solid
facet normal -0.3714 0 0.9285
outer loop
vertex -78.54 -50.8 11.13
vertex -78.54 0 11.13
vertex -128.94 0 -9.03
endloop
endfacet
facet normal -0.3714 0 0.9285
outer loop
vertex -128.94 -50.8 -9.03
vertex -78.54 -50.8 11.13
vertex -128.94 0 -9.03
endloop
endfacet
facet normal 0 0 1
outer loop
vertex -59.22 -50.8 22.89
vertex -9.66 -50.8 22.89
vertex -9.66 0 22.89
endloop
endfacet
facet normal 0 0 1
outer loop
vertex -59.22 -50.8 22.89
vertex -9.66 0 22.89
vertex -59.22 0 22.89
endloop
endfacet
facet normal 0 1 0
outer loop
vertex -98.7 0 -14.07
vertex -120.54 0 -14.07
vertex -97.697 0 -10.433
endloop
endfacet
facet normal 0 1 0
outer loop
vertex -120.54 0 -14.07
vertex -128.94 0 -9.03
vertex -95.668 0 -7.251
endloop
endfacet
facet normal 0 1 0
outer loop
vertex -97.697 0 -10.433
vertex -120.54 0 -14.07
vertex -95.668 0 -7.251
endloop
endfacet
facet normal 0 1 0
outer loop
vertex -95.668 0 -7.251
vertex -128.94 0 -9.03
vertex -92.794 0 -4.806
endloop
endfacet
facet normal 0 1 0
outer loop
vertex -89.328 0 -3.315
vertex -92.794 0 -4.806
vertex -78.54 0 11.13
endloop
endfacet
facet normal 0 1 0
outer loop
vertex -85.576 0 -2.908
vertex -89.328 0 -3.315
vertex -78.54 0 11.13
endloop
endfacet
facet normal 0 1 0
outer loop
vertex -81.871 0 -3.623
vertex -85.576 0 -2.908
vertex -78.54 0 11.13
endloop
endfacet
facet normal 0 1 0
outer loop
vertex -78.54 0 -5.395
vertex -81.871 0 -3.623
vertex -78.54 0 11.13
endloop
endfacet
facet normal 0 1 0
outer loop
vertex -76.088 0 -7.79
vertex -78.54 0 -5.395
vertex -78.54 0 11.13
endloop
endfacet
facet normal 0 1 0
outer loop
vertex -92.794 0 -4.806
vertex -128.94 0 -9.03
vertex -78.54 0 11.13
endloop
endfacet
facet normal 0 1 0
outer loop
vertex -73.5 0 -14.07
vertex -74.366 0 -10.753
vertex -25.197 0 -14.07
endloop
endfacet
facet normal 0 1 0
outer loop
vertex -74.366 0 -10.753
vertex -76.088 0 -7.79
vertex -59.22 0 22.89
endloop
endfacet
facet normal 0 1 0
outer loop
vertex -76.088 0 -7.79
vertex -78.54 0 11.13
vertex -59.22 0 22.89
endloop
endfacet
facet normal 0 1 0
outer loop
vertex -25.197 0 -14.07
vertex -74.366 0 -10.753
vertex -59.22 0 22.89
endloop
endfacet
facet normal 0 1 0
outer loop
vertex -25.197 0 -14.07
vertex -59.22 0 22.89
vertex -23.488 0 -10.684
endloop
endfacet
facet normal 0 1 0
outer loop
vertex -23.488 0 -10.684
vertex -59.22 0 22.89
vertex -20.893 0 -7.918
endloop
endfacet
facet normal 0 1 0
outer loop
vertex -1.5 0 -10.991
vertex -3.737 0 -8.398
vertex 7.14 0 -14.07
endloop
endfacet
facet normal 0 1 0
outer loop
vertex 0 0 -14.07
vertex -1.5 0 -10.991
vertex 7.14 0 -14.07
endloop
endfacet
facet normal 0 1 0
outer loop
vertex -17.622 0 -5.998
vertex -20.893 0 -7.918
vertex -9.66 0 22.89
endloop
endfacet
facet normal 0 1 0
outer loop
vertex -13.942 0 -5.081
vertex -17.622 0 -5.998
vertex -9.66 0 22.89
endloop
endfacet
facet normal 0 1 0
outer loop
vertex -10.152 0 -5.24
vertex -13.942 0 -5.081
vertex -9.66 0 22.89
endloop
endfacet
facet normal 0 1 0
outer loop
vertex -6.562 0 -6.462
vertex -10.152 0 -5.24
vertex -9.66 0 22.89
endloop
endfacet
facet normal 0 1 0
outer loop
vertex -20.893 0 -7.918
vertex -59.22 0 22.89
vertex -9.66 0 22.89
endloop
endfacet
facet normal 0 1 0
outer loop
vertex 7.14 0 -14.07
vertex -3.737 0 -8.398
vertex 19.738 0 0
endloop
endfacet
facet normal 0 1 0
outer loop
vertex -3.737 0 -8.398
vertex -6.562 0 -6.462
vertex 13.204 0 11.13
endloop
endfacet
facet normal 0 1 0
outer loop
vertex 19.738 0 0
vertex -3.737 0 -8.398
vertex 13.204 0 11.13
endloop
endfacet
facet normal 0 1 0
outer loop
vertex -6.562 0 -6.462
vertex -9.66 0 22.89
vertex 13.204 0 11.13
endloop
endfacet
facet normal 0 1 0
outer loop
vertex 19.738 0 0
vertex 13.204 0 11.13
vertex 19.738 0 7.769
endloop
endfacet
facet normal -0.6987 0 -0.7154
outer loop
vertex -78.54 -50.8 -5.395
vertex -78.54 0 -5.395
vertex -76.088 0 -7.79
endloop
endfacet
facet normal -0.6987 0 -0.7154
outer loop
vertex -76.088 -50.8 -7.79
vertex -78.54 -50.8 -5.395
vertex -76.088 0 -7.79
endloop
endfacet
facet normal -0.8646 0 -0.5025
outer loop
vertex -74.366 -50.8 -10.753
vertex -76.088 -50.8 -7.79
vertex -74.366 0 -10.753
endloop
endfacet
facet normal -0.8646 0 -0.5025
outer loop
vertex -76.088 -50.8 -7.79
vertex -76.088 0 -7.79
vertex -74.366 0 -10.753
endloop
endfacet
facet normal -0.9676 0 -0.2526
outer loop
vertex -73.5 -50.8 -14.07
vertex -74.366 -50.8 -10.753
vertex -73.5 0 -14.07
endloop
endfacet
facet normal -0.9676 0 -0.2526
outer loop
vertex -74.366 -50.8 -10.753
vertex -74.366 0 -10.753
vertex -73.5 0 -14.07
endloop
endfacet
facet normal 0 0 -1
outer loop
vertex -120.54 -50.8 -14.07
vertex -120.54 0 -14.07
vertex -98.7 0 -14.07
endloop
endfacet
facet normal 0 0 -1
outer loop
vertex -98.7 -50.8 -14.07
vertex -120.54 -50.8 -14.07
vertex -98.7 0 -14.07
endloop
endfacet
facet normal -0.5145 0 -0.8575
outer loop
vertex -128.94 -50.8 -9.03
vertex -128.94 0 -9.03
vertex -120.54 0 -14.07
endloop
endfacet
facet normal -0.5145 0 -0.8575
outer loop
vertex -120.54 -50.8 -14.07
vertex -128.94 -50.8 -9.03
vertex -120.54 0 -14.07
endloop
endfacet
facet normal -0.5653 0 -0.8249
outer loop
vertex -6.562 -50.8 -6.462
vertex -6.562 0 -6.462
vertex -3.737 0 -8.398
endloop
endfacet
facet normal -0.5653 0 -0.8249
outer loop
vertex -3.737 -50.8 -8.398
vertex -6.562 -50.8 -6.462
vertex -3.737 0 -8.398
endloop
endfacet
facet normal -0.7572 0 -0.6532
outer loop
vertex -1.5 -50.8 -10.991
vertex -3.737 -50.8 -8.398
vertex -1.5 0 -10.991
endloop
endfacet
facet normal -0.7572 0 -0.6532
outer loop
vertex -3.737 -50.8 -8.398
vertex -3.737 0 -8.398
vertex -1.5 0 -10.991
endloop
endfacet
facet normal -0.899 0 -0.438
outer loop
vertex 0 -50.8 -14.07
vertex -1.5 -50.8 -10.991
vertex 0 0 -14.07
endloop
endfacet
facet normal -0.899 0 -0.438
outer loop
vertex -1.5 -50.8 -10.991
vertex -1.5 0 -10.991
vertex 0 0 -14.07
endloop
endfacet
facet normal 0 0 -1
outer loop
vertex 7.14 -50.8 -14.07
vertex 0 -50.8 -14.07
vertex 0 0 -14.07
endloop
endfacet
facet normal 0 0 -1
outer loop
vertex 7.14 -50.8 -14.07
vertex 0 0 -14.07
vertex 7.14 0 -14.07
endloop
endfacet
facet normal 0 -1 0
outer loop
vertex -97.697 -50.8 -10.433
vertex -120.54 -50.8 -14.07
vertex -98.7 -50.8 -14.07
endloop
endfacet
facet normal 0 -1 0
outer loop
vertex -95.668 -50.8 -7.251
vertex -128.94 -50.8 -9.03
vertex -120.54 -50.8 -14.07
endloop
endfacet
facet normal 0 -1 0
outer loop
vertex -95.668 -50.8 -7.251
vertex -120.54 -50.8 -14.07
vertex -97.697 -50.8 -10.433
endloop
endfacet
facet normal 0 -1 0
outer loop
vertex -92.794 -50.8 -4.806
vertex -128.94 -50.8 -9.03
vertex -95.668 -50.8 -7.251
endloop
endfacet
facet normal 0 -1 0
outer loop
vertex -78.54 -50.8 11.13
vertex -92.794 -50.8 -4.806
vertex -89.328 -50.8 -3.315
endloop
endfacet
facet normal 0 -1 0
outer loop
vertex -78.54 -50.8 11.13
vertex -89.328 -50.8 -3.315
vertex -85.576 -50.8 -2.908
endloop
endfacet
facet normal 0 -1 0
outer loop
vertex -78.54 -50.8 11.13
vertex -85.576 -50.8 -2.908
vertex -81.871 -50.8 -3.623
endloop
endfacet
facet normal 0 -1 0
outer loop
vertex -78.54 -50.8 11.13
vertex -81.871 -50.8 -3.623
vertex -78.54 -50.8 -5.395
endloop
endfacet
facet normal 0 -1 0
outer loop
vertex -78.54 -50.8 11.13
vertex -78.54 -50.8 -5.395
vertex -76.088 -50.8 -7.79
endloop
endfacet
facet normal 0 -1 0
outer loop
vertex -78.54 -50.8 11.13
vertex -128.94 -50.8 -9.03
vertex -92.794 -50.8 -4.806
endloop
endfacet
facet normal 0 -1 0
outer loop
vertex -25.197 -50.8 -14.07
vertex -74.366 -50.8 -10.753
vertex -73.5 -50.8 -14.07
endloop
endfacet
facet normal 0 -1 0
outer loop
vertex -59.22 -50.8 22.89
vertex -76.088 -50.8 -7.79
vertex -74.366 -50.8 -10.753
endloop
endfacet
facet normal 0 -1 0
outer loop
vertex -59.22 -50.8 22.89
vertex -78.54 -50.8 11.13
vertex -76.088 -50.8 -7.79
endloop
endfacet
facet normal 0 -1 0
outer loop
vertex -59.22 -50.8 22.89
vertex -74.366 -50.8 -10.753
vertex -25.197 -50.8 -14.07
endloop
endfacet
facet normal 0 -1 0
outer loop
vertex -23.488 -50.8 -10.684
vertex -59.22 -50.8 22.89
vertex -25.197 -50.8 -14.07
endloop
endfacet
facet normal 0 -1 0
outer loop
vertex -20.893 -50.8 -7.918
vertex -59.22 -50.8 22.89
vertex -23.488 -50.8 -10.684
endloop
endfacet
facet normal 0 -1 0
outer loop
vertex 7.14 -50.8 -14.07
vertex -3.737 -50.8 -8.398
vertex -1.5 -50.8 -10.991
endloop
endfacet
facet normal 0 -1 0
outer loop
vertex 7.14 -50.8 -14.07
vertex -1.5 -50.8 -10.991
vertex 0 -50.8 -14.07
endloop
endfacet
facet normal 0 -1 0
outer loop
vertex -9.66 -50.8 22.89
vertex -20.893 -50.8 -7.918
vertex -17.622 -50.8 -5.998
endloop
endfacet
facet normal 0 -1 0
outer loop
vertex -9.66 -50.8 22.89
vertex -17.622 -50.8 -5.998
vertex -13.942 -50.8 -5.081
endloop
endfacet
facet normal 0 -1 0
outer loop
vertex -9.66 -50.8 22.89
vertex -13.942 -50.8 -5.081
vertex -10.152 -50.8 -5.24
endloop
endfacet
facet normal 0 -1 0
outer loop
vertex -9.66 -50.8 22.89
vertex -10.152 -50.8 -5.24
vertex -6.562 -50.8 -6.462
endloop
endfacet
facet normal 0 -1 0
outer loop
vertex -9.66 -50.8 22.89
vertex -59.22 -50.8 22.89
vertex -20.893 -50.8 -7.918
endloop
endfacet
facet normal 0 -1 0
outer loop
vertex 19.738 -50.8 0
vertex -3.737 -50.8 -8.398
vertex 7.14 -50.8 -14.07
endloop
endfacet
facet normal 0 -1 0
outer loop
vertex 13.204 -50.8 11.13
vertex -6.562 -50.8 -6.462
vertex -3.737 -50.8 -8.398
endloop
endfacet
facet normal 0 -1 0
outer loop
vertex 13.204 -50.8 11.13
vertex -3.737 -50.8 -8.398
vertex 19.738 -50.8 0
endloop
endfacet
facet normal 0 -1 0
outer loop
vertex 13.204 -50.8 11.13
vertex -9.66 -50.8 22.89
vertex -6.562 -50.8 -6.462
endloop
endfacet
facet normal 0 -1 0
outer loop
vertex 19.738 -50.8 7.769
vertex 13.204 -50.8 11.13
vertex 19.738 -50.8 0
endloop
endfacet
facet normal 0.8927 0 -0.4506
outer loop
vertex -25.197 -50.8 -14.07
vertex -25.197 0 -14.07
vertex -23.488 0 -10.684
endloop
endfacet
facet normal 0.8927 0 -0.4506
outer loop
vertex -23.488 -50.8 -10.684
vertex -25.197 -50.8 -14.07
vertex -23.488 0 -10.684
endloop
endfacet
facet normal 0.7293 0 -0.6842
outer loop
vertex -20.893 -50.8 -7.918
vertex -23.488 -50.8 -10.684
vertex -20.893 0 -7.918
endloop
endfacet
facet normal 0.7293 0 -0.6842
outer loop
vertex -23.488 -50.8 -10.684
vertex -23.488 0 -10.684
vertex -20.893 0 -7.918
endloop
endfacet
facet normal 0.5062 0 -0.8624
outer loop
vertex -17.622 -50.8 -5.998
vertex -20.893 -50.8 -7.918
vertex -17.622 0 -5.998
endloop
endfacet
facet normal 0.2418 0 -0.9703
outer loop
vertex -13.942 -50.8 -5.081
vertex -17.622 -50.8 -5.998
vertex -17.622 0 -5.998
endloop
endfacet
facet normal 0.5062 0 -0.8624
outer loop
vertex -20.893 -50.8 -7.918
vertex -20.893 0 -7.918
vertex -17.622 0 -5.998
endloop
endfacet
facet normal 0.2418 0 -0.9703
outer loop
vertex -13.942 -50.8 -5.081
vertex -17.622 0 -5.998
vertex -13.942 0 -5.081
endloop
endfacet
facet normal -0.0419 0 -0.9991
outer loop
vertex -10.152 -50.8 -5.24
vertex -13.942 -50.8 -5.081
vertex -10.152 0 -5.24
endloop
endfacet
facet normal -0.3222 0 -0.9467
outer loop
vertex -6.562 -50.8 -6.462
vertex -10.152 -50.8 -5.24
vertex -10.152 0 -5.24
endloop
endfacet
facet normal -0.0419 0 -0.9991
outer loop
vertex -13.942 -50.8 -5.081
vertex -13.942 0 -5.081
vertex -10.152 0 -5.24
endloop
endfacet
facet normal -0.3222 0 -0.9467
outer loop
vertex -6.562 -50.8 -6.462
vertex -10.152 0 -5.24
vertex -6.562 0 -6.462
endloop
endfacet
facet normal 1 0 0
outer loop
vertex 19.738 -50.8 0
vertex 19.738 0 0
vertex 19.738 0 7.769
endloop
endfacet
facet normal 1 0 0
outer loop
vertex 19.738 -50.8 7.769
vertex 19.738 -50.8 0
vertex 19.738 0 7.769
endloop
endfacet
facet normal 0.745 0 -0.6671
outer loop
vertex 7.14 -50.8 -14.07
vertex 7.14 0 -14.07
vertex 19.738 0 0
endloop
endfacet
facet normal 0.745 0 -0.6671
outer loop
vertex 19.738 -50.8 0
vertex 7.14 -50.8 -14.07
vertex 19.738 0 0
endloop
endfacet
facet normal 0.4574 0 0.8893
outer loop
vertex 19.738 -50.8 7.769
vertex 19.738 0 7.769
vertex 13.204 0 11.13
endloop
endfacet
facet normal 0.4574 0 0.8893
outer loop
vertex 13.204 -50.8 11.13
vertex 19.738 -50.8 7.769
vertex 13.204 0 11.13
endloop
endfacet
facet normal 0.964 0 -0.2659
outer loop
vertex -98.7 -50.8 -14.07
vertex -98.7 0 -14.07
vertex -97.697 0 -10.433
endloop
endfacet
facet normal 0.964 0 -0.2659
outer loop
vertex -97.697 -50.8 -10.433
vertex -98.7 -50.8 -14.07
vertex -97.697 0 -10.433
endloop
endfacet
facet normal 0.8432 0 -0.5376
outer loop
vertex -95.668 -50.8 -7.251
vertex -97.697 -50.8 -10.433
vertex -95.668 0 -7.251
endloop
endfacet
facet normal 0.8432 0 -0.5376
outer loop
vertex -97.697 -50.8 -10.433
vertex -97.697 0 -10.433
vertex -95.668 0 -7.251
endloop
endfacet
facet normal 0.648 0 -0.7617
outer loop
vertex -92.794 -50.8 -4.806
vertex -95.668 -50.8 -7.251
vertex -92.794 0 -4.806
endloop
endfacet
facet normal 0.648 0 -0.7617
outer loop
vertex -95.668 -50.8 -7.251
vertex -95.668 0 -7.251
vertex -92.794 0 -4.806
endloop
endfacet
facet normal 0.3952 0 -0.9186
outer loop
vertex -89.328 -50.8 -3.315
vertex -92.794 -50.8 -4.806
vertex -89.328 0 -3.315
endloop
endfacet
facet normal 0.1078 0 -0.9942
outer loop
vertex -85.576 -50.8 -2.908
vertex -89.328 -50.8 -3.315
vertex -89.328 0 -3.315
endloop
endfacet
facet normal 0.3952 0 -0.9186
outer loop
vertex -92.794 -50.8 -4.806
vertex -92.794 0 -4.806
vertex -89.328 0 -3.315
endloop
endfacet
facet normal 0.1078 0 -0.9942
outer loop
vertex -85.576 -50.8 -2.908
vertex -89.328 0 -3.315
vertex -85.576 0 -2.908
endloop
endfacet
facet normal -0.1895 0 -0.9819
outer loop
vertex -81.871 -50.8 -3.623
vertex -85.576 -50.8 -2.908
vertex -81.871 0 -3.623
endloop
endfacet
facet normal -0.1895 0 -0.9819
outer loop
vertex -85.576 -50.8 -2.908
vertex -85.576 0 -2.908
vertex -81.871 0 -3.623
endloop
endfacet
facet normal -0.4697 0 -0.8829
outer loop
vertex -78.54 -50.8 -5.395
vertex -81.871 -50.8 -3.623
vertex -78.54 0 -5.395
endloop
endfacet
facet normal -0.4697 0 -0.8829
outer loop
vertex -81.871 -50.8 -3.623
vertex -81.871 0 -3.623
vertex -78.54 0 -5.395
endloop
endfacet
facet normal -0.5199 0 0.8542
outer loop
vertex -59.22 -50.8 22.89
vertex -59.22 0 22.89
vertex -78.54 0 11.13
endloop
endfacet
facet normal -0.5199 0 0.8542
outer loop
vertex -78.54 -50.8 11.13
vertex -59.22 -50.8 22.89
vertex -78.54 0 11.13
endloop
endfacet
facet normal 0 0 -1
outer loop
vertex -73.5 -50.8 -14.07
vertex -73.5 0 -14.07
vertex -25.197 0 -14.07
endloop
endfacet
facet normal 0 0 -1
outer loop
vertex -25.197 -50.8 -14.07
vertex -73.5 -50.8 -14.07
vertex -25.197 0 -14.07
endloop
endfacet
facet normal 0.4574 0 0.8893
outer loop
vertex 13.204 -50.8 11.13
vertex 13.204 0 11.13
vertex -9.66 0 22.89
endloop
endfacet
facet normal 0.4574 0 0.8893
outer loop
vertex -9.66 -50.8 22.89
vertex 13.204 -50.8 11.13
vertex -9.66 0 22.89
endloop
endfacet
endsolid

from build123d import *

# Parameters (mm, degrees)
F1_DEPTH = 50.8


with BuildPart() as f1:
    # F0 (on Front) → F1 (new body)
    with BuildSketch(Plane.XZ):
        with BuildLine():
            Line((-128.940001, -9.03), (-120.54, -14.07))
            Line((-120.54, -14.07), (-98.700002, -14.07))
            ThreePointArc((-98.700002, -14.07), (-91.116523, -3.930836), (-78.540005, -5.394729))
            Line((-78.540005, -5.394729), (-78.540005, 11.130001))
            Line((-78.540005, 11.130001), (-128.940001, -9.03))
        make_face()
        with BuildLine():
            Line((-78.540005, 11.130001), (-78.540005, -5.394729))
            ThreePointArc((-78.540005, -5.394729), (-75.12633, -9.213174), (-73.5, -14.07))
            Line((-73.5, -14.07), (-34.44, -14.07))
            Line((-34.44, -14.07), (-34.44, 11.130001))
            Line((-34.44, 11.130001), (-78.540005, 11.130001))
        make_face()
        Polygon((-59.220001, 22.89), (-78.540005, 11.130001), (-34.44, 11.130001), (-6.562005, 11.130001), (13.203657, 11.130001), (-9.659999, 22.89), align=None)
        with BuildLine():
            Line((-6.562005, 11.130001), (-34.44, 11.130001))
            Line((-34.44, 11.130001), (-34.44, -14.07))
            Line((-34.44, -14.07), (-25.1968, -14.07))
            ThreePointArc((-25.1968, -14.07), (-17.621716, -5.998406), (-6.562005, -6.462444))
            Line((-6.562005, -6.462444), (-6.562005, 11.130001))
        make_face()
        with BuildLine():
            Line((13.203657, 11.130001), (-6.562005, 11.130001))
            Line((-6.562005, 11.130001), (-6.562005, -6.462444))
            ThreePointArc((-6.562005, -6.462444), (-2.534474, -9.622293), (0, -14.07))
            Line((0, -14.07), (7.139999, -14.07))
            Line((7.139999, -14.07), (19.737999, 0))
            Line((19.737999, 0), (19.737999, 7.769039))
            Line((19.737999, 7.769039), (13.203657, 11.130001))
        make_face()
    extrude(amount=F1_DEPTH)


solid = f1.part
